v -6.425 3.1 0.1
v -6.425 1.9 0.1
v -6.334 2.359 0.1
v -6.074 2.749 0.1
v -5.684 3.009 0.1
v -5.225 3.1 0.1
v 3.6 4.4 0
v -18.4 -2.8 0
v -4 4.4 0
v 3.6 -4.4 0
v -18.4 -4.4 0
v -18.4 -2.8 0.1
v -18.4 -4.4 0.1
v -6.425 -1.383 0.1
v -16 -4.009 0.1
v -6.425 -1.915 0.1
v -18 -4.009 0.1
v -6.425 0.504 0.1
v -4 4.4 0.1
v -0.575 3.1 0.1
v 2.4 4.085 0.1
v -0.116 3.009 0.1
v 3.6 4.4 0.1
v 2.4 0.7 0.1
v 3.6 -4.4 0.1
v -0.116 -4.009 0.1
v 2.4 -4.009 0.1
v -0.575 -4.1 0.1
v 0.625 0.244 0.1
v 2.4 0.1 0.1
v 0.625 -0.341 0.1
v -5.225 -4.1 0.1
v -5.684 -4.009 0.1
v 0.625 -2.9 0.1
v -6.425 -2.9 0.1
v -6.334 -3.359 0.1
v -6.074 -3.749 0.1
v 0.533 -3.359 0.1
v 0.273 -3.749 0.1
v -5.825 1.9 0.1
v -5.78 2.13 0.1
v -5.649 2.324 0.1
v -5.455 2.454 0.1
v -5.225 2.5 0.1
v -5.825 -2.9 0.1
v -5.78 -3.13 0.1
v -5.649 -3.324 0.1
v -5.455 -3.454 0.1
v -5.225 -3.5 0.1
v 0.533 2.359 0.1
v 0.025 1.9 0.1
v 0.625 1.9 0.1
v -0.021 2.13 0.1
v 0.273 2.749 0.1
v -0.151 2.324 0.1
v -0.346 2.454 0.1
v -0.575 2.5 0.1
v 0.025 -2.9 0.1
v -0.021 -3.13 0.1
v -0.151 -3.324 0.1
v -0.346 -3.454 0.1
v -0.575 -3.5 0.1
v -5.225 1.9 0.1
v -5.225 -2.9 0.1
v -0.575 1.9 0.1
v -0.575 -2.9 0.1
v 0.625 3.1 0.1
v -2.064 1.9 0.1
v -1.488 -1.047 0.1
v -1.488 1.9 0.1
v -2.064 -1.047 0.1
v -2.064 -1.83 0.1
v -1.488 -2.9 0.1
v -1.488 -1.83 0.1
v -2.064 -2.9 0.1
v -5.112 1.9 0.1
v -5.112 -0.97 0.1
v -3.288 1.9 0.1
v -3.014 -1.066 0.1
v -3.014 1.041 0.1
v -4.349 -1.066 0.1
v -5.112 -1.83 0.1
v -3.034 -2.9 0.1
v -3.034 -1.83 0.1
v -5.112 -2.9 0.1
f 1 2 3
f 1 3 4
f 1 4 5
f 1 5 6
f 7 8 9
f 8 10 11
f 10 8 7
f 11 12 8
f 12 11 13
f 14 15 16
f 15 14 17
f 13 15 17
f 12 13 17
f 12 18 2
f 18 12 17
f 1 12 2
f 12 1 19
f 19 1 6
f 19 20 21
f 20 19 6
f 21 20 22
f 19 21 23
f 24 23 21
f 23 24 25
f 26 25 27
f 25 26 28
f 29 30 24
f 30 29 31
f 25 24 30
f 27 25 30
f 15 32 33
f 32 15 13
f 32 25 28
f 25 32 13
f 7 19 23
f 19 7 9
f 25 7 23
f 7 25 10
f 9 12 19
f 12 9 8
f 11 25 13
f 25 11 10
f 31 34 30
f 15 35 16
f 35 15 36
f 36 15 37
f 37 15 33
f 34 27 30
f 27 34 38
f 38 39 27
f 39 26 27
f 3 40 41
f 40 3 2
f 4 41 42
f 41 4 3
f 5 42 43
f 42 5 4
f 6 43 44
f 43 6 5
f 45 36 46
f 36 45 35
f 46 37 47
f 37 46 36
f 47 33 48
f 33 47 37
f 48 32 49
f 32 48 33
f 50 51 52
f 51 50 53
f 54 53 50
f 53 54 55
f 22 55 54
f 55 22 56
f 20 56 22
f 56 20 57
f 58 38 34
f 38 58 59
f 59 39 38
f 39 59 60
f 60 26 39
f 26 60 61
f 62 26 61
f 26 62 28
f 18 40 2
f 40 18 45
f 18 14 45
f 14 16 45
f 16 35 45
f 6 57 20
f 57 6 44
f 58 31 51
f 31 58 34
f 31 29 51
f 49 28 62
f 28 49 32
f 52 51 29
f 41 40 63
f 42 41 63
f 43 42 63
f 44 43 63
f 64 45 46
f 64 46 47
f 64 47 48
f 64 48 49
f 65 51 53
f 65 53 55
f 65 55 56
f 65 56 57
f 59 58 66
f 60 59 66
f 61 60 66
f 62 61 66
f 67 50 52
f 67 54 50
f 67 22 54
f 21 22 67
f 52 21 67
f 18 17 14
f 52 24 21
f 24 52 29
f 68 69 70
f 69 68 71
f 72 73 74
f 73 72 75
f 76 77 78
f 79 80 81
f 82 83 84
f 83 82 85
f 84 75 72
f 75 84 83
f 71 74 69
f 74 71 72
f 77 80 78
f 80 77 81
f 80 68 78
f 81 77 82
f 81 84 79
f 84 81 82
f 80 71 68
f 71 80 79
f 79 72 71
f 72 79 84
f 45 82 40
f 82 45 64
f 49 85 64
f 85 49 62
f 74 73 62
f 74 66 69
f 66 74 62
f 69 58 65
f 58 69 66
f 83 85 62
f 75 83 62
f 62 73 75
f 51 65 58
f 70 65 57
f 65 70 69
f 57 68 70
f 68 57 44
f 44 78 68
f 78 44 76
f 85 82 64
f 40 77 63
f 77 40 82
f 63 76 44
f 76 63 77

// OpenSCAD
// file: ../p/1-4ndis.scad
use <../lib.scad>
function ldraw_lib__1_4ndis() = [
// 0 Disc Negative 0.25
// 0 Name: 1-4ndis.dat
// 0 Author: James Jessiman
// 0 !LDRAW_ORG Primitive UPDATE 2012-01
// 0 !LICENSE Licensed under CC BY 2.0 and CC BY 4.0 : see CAreadme.txt
// 
// 0 BFC CERTIFY CCW
  [0,"BFC","CERTIFY"],
  [0,"BFC","CCW"],
// 
// 0 !HISTORY 2002-03-23 [sbliss] Added BFC Statement
// 0 !HISTORY 2002-04-25 [PTadmin] Official Update 2002-02
// 0 !HISTORY 2007-06-22 [PTadmin] Header formatted for Contributor Agreement
// 0 !HISTORY 2008-07-01 [PTadmin] Official Update 2008-01
// 0 !HISTORY 2012-02-16 [Philo] Changed to CCW
// 0 !HISTORY 2012-03-30 [PTadmin] Official Update 2012-01
// 
// 
// 3 16 0.9239 0 0.3827 1 0 0 1 0 1
  [3,16,0.9239,0,0.3827,1,0,0,1,0,1],
// 3 16 0.7071 0 0.7071 0.9239 0 0.3827 1 0 1
  [3,16,0.7071,0,0.7071,0.9239,0,0.3827,1,0,1],
// 3 16 0.3827 0 0.9239 0.7071 0 0.7071 1 0 1
  [3,16,0.3827,0,0.9239,0.7071,0,0.7071,1,0,1],
// 3 16 0 0 1 0.3827 0 0.9239 1 0 1
  [3,16,0,0,1,0.3827,0,0.9239,1,0,1],
];
module ldraw_lib__1_4ndis(step=0, col=false, unit=2/5, alt=false, line=0.2, solid=!$preview)
    makepoly(ldraw_lib__1_4ndis(), step=step, col=col, unit=unit, alt=alt, line=line, solid=solid);
ldraw_lib__1_4ndis(line=0.2);
// file: ../p/3-16ndis.scad
use <../lib.scad>
function ldraw_lib__3_16ndis() = [
// 0 Disc Negative 0.1875
// 0 Name: 3-16ndis.dat
// 0 Author: Guy Vivan [guyvivan]
// 0 !LDRAW_ORG Primitive UPDATE 2009-01
// 0 !LICENSE Licensed under CC BY 2.0 and CC BY 4.0 : see CAreadme.txt
// 
// 0 BFC CERTIFY CCW
  [0,"BFC","CERTIFY"],
  [0,"BFC","CCW"],
// 
// 0 !HISTORY 2009-05-02 [PTadmin] Official Update 2009-01
// 
// 
// 3 16 1 0 1 0.9239 0 0.3827 1 0 0
  [3,16,1,0,1,0.9239,0,0.3827,1,0,0],
// 3 16 1 0 1 0.7071 0 0.7071 0.9239 0 0.3827
  [3,16,1,0,1,0.7071,0,0.7071,0.9239,0,0.3827],
// 3 16 1 0 1 0.3827 0 0.9239 0.7071 0 0.7071
  [3,16,1,0,1,0.3827,0,0.9239,0.7071,0,0.7071],
// 
// 0 end of file
// 
];
module ldraw_lib__3_16ndis(step=0, col=false, unit=2/5, alt=false, line=0.2, solid=!$preview)
    makepoly(ldraw_lib__3_16ndis(), step=step, col=col, unit=unit, alt=alt, line=line, solid=solid);
ldraw_lib__3_16ndis(line=0.2);
// file: ../p/1-4ring1.scad
use <../lib.scad>
function ldraw_lib__1_4ring1() = [
// 0 Ring  1 x 0.25
// 0 Name: 1-4ring1.dat
// 0 Author: Chris Dee [cwdee]
// 0 !LDRAW_ORG Primitive UPDATE 2012-01
// 0 !LICENSE Licensed under CC BY 2.0 and CC BY 4.0 : see CAreadme.txt
// 
// 0 BFC CERTIFY CCW
  [0,"BFC","CERTIFY"],
  [0,"BFC","CCW"],
// 
// 0 !HISTORY 2000-05-07 [PTadmin] Official Update 2000-01
// 0 !HISTORY 2002-11-22 [hafhead] Added BFC statement
// 0 !HISTORY 2002-11-30 [PTadmin] Official Update 2002-05
// 0 !HISTORY 2007-06-22 [PTadmin] Header formatted for Contributor Agreement
// 0 !HISTORY 2008-07-01 [PTadmin] Official Update 2008-01
// 0 !HISTORY 2012-02-16 [Philo] Changed to CCW
// 0 !HISTORY 2012-03-30 [PTadmin] Official Update 2012-01
// 
// 
// 4 16 2 0 0 1.8478 0 0.7654 0.9239 0 0.3827 1 0 0
  [4,16,2,0,0,1.8478,0,0.7654,0.9239,0,0.3827,1,0,0],
// 4 16 1.8478 0 0.7654 1.4142 0 1.4142 0.7071 0 0.7071 0.9239 0 0.3827
  [4,16,1.8478,0,0.7654,1.4142,0,1.4142,0.7071,0,0.7071,0.9239,0,0.3827],
// 4 16 1.4142 0 1.4142 0.7654 0 1.8478 0.3827 0 0.9239 0.7071 0 0.7071
  [4,16,1.4142,0,1.4142,0.7654,0,1.8478,0.3827,0,0.9239,0.7071,0,0.7071],
// 4 16 0.7654 0 1.8478 0 0 2 0 0 1 0.3827 0 0.9239
  [4,16,0.7654,0,1.8478,0,0,2,0,0,1,0.3827,0,0.9239],
];
module ldraw_lib__1_4ring1(step=0, col=false, unit=2/5, alt=false, line=0.2, solid=!$preview)
    makepoly(ldraw_lib__1_4ring1(), step=step, col=col, unit=unit, alt=alt, line=line, solid=solid);
ldraw_lib__1_4ring1(line=0.2);
// file: ../p/1-4disc.scad
use <../lib.scad>
function ldraw_lib__1_4disc() = [
// 0 Disc 0.25
// 0 Name: 1-4disc.dat
// 0 Author: James Jessiman
// 0 !LDRAW_ORG Primitive UPDATE 2002-02
// 0 !LICENSE Licensed under CC BY 2.0 and CC BY 4.0 : see CAreadme.txt
// 
// 0 BFC CERTIFY CCW
  [0,"BFC","CERTIFY"],
  [0,"BFC","CCW"],
// 
// 0 !HISTORY 2002-03-23 [sbliss] Added BFC statement.
// 0 !HISTORY 2002-04-25 [PTadmin] Official Update 2002-02
// 0 !HISTORY 2007-06-22 [PTadmin] Header formatted for Contributor Agreement
// 0 !HISTORY 2008-07-01 [PTadmin] Official Update 2008-01
// 
// 
// 3 16 0 0 0 1 0 0 0.9239 0 0.3827
  [3,16,0,0,0,1,0,0,0.9239,0,0.3827],
// 3 16 0 0 0 0.9239 0 0.3827 0.7071 0 0.7071
  [3,16,0,0,0,0.9239,0,0.3827,0.7071,0,0.7071],
// 3 16 0 0 0 0.7071 0 0.7071 0.3827 0 0.9239
  [3,16,0,0,0,0.7071,0,0.7071,0.3827,0,0.9239],
// 3 16 0 0 0 0.3827 0 0.9239 0 0 1
  [3,16,0,0,0,0.3827,0,0.9239,0,0,1],
// 0
];
module ldraw_lib__1_4disc(step=0, col=false, unit=2/5, alt=false, line=0.2, solid=!$preview)
    makepoly(ldraw_lib__1_4disc(), step=step, col=col, unit=unit, alt=alt, line=line, solid=solid);
ldraw_lib__1_4disc(line=0.2);
// file: ../p/type-swiss721bt-bold-n4.scad
use <../lib.scad>
function ldraw_lib__type_swiss721bt_bold_n4() = [
// 0 Type Swiss721BT Number "4" Bold
// 0 Name: type-swiss721bt-bold-n4.dat
// 0 Author: Ulrich Röder [UR]
// 0 !LDRAW_ORG Primitive UPDATE 2019-01
// 0 !LICENSE Licensed under CC BY 2.0 and CC BY 4.0 : see CAreadme.txt
// 
// 0 BFC CERTIFY CCW
  [0,"BFC","CERTIFY"],
  [0,"BFC","CCW"],
// 
// 0 !HISTORY 2019-06-28 [PTadmin] Official Update 2019-01
// 
// 
// 0 // Main
// 4 16 .3775 0 .5 .2575 0 .5 .2575 0 -.114 .3775 0 -.114
  [4,16,.3775,0,.5,.2575,0,.5,.2575,0,-.114,.3775,0,-.114],
// 4 16 .2575 0 -.5 .3775 0 -.5 .3775 0 -.277 .2575 0 -.277
  [4,16,.2575,0,-.5,.3775,0,-.5,.3775,0,-.277,.2575,0,-.277],
// 3 16 -.3775 0 .5 -.3775 0 -.098 .0025 0 .5
  [3,16,-.3775,0,.5,-.3775,0,-.098,.0025,0,.5],
// 3 16 .0595 0 -.118 .0595 0 .321 -.2185 0 -.118
  [3,16,.0595,0,-.118,.0595,0,.321,-.2185,0,-.118],
// 4 16 .0555 0 -.5 .0555 0 -.277 -.3775 0 -.277 -.3775 0 -.5
  [4,16,.0555,0,-.5,.0555,0,-.277,-.3775,0,-.277,-.3775,0,-.5],
// 
// 0 // Black
// 4 0 .0555 0 -.5 .2575 0 -.5 .2575 0 -.277 .0555 0 -.277
  [4,0,.0555,0,-.5,.2575,0,-.5,.2575,0,-.277,.0555,0,-.277],
// 4 0 .2575 0 -.114 .2575 0 -.277 .3775 0 -.277 .3775 0 -.114
  [4,0,.2575,0,-.114,.2575,0,-.277,.3775,0,-.277,.3775,0,-.114],
// 4 0 -.2185 0 -.118 .0595 0 .321 .0025 0 .5 -.3775 0 -.098
  [4,0,-.2185,0,-.118,.0595,0,.321,.0025,0,.5,-.3775,0,-.098],
// 3 0 .0595 0 .321 .2575 0 .5 .0025 0 .5
  [3,0,.0595,0,.321,.2575,0,.5,.0025,0,.5],
// 3 0 -.2185 0 -.118 -.3775 0 -.098 -.3775 0 -.277
  [3,0,-.2185,0,-.118,-.3775,0,-.098,-.3775,0,-.277],
// 4 0 .0595 0 -.118 -.2185 0 -.118 -.3775 0 -.277 .0555 0 -.277
  [4,0,.0595,0,-.118,-.2185,0,-.118,-.3775,0,-.277,.0555,0,-.277],
// 4 0 .2575 0 -.114 .2575 0 .5 .0595 0 .321 .0595 0 -.118
  [4,0,.2575,0,-.114,.2575,0,.5,.0595,0,.321,.0595,0,-.118],
// 4 0 .0555 0 -.277 .2575 0 -.277 .2575 0 -.114 .0595 0 -.118
  [4,0,.0555,0,-.277,.2575,0,-.277,.2575,0,-.114,.0595,0,-.118],
];
module ldraw_lib__type_swiss721bt_bold_n4(step=0, col=false, unit=2/5, alt=false, line=0.2, solid=!$preview)
    makepoly(ldraw_lib__type_swiss721bt_bold_n4(), step=step, col=col, unit=unit, alt=alt, line=line, solid=solid);
ldraw_lib__type_swiss721bt_bold_n4(line=0.2);
// file: s/821435as03.scad
use <../../lib.scad>
use <../../p/1-4ndis.scad>
function ldraw_lib__s__821435as03() = [
// 0 ~Sticker Sloped Body for Racing Number
// 0 Name: s\821435as03.dat
// 0 Author: Ulrich Röder [UR]
// 0 !LDRAW_ORG Subpart UPDATE 2019-01
// 0 !LICENSE Licensed under CC BY 2.0 and CC BY 4.0 : see CAreadme.txt
// 
// 0 BFC CERTIFY CCW
  [0,"BFC","CERTIFY"],
  [0,"BFC","CCW"],
// 
// 0 !HISTORY 2019-06-28 [PTadmin] Official Update 2019-01
// 
// 
// 0 // Main
// 1 16 13.063 -.25 4.75 3 0 0 0 1 0 0 0 3 1-4ndis.dat
  [1,16,13.063,-.25,4.75,3,0,0,0,1,0,0,0,3, ldraw_lib__1_4ndis()],
// 3 16 10 0 11 46 0 -7 -9 0 11
  [3,16,10,0,11,46,0,-7,-9,0,11],
// 4 16 -9 0 -11 -9 0 11 46 0 -7 46 0 -11
  [4,16,-9,0,-11,-9,0,11,46,0,-7,46,0,-11],
// 4 16 46 -.25 -11 46 0 -11 46 0 -7 46 -.25 -7
  [4,16,46,-.25,-11,46,0,-11,46,0,-7,46,-.25,-7],
// 4 16 16.063 -.25 -4.788 40 -.25 -10.022 45 -.25 -10.022 16.063 -.25 -3.458
  [4,16,16.063,-.25,-4.788,40,-.25,-10.022,45,-.25,-10.022,16.063,-.25,-3.458],
// 3 16 45 -.25 -10.022 40 -.25 -10.022 46 -.25 -11
  [3,16,45,-.25,-10.022,40,-.25,-10.022,46,-.25,-11],
// 3 16 45 -.25 -10.022 46 -.25 -11 46 -.25 -7
  [3,16,45,-.25,-10.022,46,-.25,-11,46,-.25,-7],
// 4 16 16.063 -.25 4.75 16.063 -.25 1.261 45 -.25 -10.022 46 -.25 -7
  [4,16,16.063,-.25,4.75,16.063,-.25,1.261,45,-.25,-10.022,46,-.25,-7],
// 3 16 16.063 -.25 4.75 46 -.25 -7 16.063 -.25 7.75
  [3,16,16.063,-.25,4.75,46,-.25,-7,16.063,-.25,7.75],
// 3 16 10 -.25 11 16.063 -.25 7.75 46 -.25 -7
  [3,16,10,-.25,11,16.063,-.25,7.75,46,-.25,-7],
// 3 16 13.063 -.25 7.75 16.063 -.25 7.75 10 -.25 11
  [3,16,13.063,-.25,7.75,16.063,-.25,7.75,10,-.25,11],
// 4 16 -6 -.25 10.213 1.438 -.25 7.75 13.063 -.25 7.75 10 -.25 11
  [4,16,-6,-.25,10.213,1.438,-.25,7.75,13.063,-.25,7.75,10,-.25,11],
// 3 16 .2899 -.25 7.5217 1.438 -.25 7.75 -6 -.25 10.213
  [3,16,.2899,-.25,7.5217,1.438,-.25,7.75,-6,-.25,10.213],
// 3 16 -9 -.25 11 -6 -.25 10.213 10 -.25 11
  [3,16,-9,-.25,11,-6,-.25,10.213,10,-.25,11],
// 4 16 -9 -.25 -11 -6 -.25 1.75 -6 -.25 10.213 -9 -.25 11
  [4,16,-9,-.25,-11,-6,-.25,1.75,-6,-.25,10.213,-9,-.25,11],
// 4 16 1.438 -.25 -10.25 .2899 -.25 -10.0217 -6 -.25 -10.022 -9 -.25 -11
  [4,16,1.438,-.25,-10.25,.2899,-.25,-10.0217,-6,-.25,-10.022,-9,-.25,-11],
// 4 16 -1.563 -.25 .61 -6 -.25 1.75 -6 -.25 .25 -1.563 -.25 -.853
  [4,16,-1.563,-.25,.61,-6,-.25,1.75,-6,-.25,.25,-1.563,-.25,-.853],
// 3 16 -6 -.25 .25 -6 -.25 1.75 -9 -.25 -11
  [3,16,-6,-.25,.25,-6,-.25,1.75,-9,-.25,-11],
// 3 16 -6 -.25 .25 -9 -.25 -11 -6 -.25 -10.022
  [3,16,-6,-.25,.25,-9,-.25,-11,-6,-.25,-10.022],
// 4 16 40 -.25 -10.022 14.2111 -.25 -10.0217 13.063 -.25 -10.25 46 -.25 -11
  [4,16,40,-.25,-10.022,14.2111,-.25,-10.0217,13.063,-.25,-10.25,46,-.25,-11],
// 4 16 1.438 -.25 -10.25 -9 -.25 -11 46 -.25 -11 13.063 -.25 -10.25
  [4,16,1.438,-.25,-10.25,-9,-.25,-11,46,-.25,-11,13.063,-.25,-10.25],
// 4 16 -9 -.25 11 10 -.25 11 10 0 11 -9 0 11
  [4,16,-9,-.25,11,10,-.25,11,10,0,11,-9,0,11],
// 4 16 -9 0 11 -9 0 -11 -9 -.25 -11 -9 -.25 11
  [4,16,-9,0,11,-9,0,-11,-9,-.25,-11,-9,-.25,11],
// 4 16 10 -.25 11 46 -.25 -7 46 0 -7 10 0 11
  [4,16,10,-.25,11,46,-.25,-7,46,0,-7,10,0,11],
// 4 16 46 0 -11 46 -.25 -11 -9 -.25 -11 -9 0 -11
  [4,16,46,0,-11,46,-.25,-11,-9,-.25,-11,-9,0,-11],
];
module ldraw_lib__s__821435as03(step=0, col=false, unit=2/5, alt=false, line=0.2, solid=!$preview)
    makepoly(ldraw_lib__s__821435as03(), step=step, col=col, unit=unit, alt=alt, line=line, solid=solid);
ldraw_lib__s__821435as03(line=0.2);
// file: s/821435as02.scad
use <../../lib.scad>
use <../../p/3-16ndis.scad>
function ldraw_lib__s__821435as02() = [
// 0 ~Sticker Upper Triangle with Cutout for Racing Number
// 0 Name: s\821435as02.dat
// 0 Author: Ulrich Röder [UR]
// 0 !LDRAW_ORG Subpart UPDATE 2019-01
// 0 !LICENSE Licensed under CC BY 2.0 and CC BY 4.0 : see CAreadme.txt
// 
// 0 BFC CERTIFY CCW
  [0,"BFC","CERTIFY"],
  [0,"BFC","CCW"],
// 
// 0 !HISTORY 2019-06-28 [PTadmin] Official Update 2019-01
// 
// 
// 0 // Main
// 1 16 1.438 -.25 4.75 -3 0 0 0 1 0 0 0 3 3-16ndis.dat
  [1,16,1.438,-.25,4.75,-3,0,0,0,1,0,0,0,3, ldraw_lib__3_16ndis()],
// 3 16 -1.562 -.25 7.75 .2899 -.25 7.5217 -6 -.25 10.213
  [3,16,-1.562,-.25,7.75,.2899,-.25,7.5217,-6,-.25,10.213],
// 3 16 -1.562 -.25 7.75 -6 -.25 10.213 -1.562 -.25 4.75
  [3,16,-1.562,-.25,7.75,-6,-.25,10.213,-1.562,-.25,4.75],
// 3 16 16.063 -.25 -3.458 45 -.25 -10.022 16.063 -.25 1.261
  [3,16,16.063,-.25,-3.458,45,-.25,-10.022,16.063,-.25,1.261],
// 4 16 -6 -.25 1.75 -1.563 -.25 .61 -1.562 -.25 4.75 -6 -.25 10.213
  [4,16,-6,-.25,1.75,-1.563,-.25,.61,-1.562,-.25,4.75,-6,-.25,10.213],
];
module ldraw_lib__s__821435as02(step=0, col=false, unit=2/5, alt=false, line=0.2, solid=!$preview)
    makepoly(ldraw_lib__s__821435as02(), step=step, col=col, unit=unit, alt=alt, line=line, solid=solid);
ldraw_lib__s__821435as02(line=0.2);
// file: s/821435as01.scad
use <../../lib.scad>
use <../../p/1-4disc.scad>
use <../../p/1-4ring1.scad>
function ldraw_lib__s__821435as01() = [
// 0 ~Sticker Lower Triangle and Racing Number Frame
// 0 Name: s\821435as01.dat
// 0 Author: Ulrich Röder [UR]
// 0 !LDRAW_ORG Subpart UPDATE 2019-01
// 0 !LICENSE Licensed under CC BY 2.0 and CC BY 4.0 : see CAreadme.txt
// 
// 0 BFC CERTIFY CCW
  [0,"BFC","CERTIFY"],
  [0,"BFC","CCW"],
// 
// 0 !HISTORY 2019-06-28 [PTadmin] Official Update 2019-01
// 
// 
// 0 // Main
// 
// 3 16 -6 -0.25 0.25 -1.562 -0.25 -7.25 -1.563 -0.25 -0.853
  [3,16,-6,-0.25,0.25,-1.562,-0.25,-7.25,-1.563,-0.25,-0.853],
// 3 16 16.063 -0.25 -4.788 16.063 -0.25 -7.25 40 -0.25 -10.022
  [3,16,16.063,-0.25,-4.788,16.063,-0.25,-7.25,40,-0.25,-10.022],
// 3 16 15.8347 -0.25 -8.3981 40 -0.25 -10.022 16.063 -0.25 -7.25
  [3,16,15.8347,-0.25,-8.3981,40,-0.25,-10.022,16.063,-0.25,-7.25],
// 3 16 15.1843 -0.25 -9.3713 40 -0.25 -10.022 15.8347 -0.25 -8.3981
  [3,16,15.1843,-0.25,-9.3713,40,-0.25,-10.022,15.8347,-0.25,-8.3981],
// 3 16 14.2111 -0.25 -10.0217 40 -0.25 -10.022 15.1843 -0.25 -9.3713
  [3,16,14.2111,-0.25,-10.0217,40,-0.25,-10.022,15.1843,-0.25,-9.3713],
// 4 16 -6 -0.25 0.25 -6 -0.25 -10.022 -1.3337 -0.25 -8.3981 -1.562 -0.25 -7.25
  [4,16,-6,-0.25,0.25,-6,-0.25,-10.022,-1.3337,-0.25,-8.3981,-1.562,-0.25,-7.25],
// 3 16 -6 -0.25 -10.022 -0.6833 -0.25 -9.3713 -1.3337 -0.25 -8.3981
  [3,16,-6,-0.25,-10.022,-0.6833,-0.25,-9.3713,-1.3337,-0.25,-8.3981],
// 3 16 -6 -0.25 -10.022 0.2899 -0.25 -10.0217 -0.6833 -0.25 -9.3713
  [3,16,-6,-0.25,-10.022,0.2899,-0.25,-10.0217,-0.6833,-0.25,-9.3713],
// 
// 0 // Black
// 1 0 13.063 -.25 4.75 1.5 0 0 0 1 0 0 0 1.5 1-4ring1.dat
  [1,0,13.063,-.25,4.75,1.5,0,0,0,1,0,0,0,1.5, ldraw_lib__1_4ring1()],
// 1 0 13.063 -.25 -7.25 1.5 0 0 0 1 0 0 0 -1.5 1-4ring1.dat
  [1,0,13.063,-.25,-7.25,1.5,0,0,0,1,0,0,0,-1.5, ldraw_lib__1_4ring1()],
// 1 0 1.438 -.25 4.75 -1.5 0 0 0 1 0 0 0 1.5 1-4ring1.dat
  [1,0,1.438,-.25,4.75,-1.5,0,0,0,1,0,0,0,1.5, ldraw_lib__1_4ring1()],
// 1 0 1.438 -.25 -7.25 -1.5 0 0 0 1 0 0 0 -1.5 1-4ring1.dat
  [1,0,1.438,-.25,-7.25,-1.5,0,0,0,1,0,0,0,-1.5, ldraw_lib__1_4ring1()],
// 4 0 14.563 -0.25 4.75 14.563 -0.25 -7.25 16.063 -0.25 1.261 16.063 -0.25 4.75
  [4,0,14.563,-0.25,4.75,14.563,-0.25,-7.25,16.063,-0.25,1.261,16.063,-0.25,4.75],
// 3 0 14.563 -0.25 -7.25 16.063 -0.25 -3.458 16.063 -0.25 1.261
  [3,0,14.563,-0.25,-7.25,16.063,-0.25,-3.458,16.063,-0.25,1.261],
// 3 0 14.563 -0.25 -7.25 16.063 -0.25 -4.788 16.063 -0.25 -3.458
  [3,0,14.563,-0.25,-7.25,16.063,-0.25,-4.788,16.063,-0.25,-3.458],
// 3 0 14.563 -0.25 -7.25 16.063 -0.25 -7.25 16.063 -0.25 -4.788
  [3,0,14.563,-0.25,-7.25,16.063,-0.25,-7.25,16.063,-0.25,-4.788],
// 4 0 13.063 -0.25 6.25 13.063 -0.25 7.75 1.438 -0.25 7.75 1.438 -0.25 6.25
  [4,0,13.063,-0.25,6.25,13.063,-0.25,7.75,1.438,-0.25,7.75,1.438,-0.25,6.25],
// 4 0 -0.062 -0.25 4.75 -1.563 -0.25 -0.853 -1.562 -0.25 -7.25 -0.062 -0.25 -7.25
  [4,0,-0.062,-0.25,4.75,-1.563,-0.25,-0.853,-1.562,-0.25,-7.25,-0.062,-0.25,-7.25],
// 3 0 -0.062 -0.25 4.75 -1.563 -0.25 0.61 -1.563 -0.25 -0.853
  [3,0,-0.062,-0.25,4.75,-1.563,-0.25,0.61,-1.563,-0.25,-0.853],
// 4 0 1.438 -0.25 -10.25 13.063 -0.25 -10.25 13.063 -0.25 -8.75 1.438 -0.25 -8.75
  [4,0,1.438,-0.25,-10.25,13.063,-0.25,-10.25,13.063,-0.25,-8.75,1.438,-0.25,-8.75],
// 3 0 -1.563 -0.25 0.61 -0.062 -0.25 4.75 -1.562 -0.25 4.75
  [3,0,-1.563,-0.25,0.61,-0.062,-0.25,4.75,-1.562,-0.25,4.75],
// 
// 0 // White
// 1 15 13.063 -.25 4.75 1.5 0 0 0 1 0 0 0 1.5 1-4disc.dat
  [1,15,13.063,-.25,4.75,1.5,0,0,0,1,0,0,0,1.5, ldraw_lib__1_4disc()],
// 1 15 13.063 -.25 -7.25 1.5 0 0 0 1 0 0 0 -1.5 1-4disc.dat
  [1,15,13.063,-.25,-7.25,1.5,0,0,0,1,0,0,0,-1.5, ldraw_lib__1_4disc()],
// 1 15 1.438 -.25 4.75 -1.5 0 0 0 1 0 0 0 1.5 1-4disc.dat
  [1,15,1.438,-.25,4.75,-1.5,0,0,0,1,0,0,0,1.5, ldraw_lib__1_4disc()],
// 1 15 1.438 -.25 -7.25 -1.5 0 0 0 1 0 0 0 -1.5 1-4disc.dat
  [1,15,1.438,-.25,-7.25,-1.5,0,0,0,1,0,0,0,-1.5, ldraw_lib__1_4disc()],
];
module ldraw_lib__s__821435as01(step=0, col=false, unit=2/5, alt=false, line=0.2, solid=!$preview)
    makepoly(ldraw_lib__s__821435as01(), step=step, col=col, unit=unit, alt=alt, line=line, solid=solid);
ldraw_lib__s__821435as01(line=0.2);
// main file
use <../lib.scad>
use <s/821435as01.scad>
use <s/821435as02.scad>
use <s/821435as03.scad>
use <../p/type-swiss721bt-bold-n4.scad>
function ldraw_lib__821435h() = [
// 0 Sticker with White/Red Triangles and Racing Number "4", Left
// 0 Name: 821435h.dat
// 0 Author: Ulrich Röder [UR]
// 0 !LDRAW_ORG Part UPDATE 2019-01
// 0 !LICENSE Licensed under CC BY 2.0 and CC BY 4.0 : see CAreadme.txt
// 
// 0 BFC CERTIFY CCW
  [0,"BFC","CERTIFY"],
  [0,"BFC","CCW"],
// 
// 0 !KEYWORDS cup, Racers, Set 6539
// 
// 0 !HISTORY 2019-06-28 [PTadmin] Official Update 2019-01
// 
// 
// 0 // Main
// 
// 1 16 0 0 0 -1 0 0 0 1 0 0 0 1 s\821435as03.dat
  [1,16,0,0,0,-1,0,0,0,1,0,0,0,1, ldraw_lib__s__821435as03()],
// 
// 0 // Red
// 1 4 0 0 0 -1 0 0 0 1 0 0 0 1 s\821435as01.dat
  [1,4,0,0,0,-1,0,0,0,1,0,0,0,1, ldraw_lib__s__821435as01()],
// 
// 0 // White
// 1 15 0 0 0 -1 0 0 0 1 0 0 0 1 s\821435as02.dat
  [1,15,0,0,0,-1,0,0,0,1,0,0,0,1, ldraw_lib__s__821435as02()],
// 1 15 -8.25 -.25 -1.25 12 0 0 0 1 0 0 0 12 type-swiss721bt-bold-n4.dat
  [1,15,-8.25,-.25,-1.25,12,0,0,0,1,0,0,0,12, ldraw_lib__type_swiss721bt_bold_n4()],
// 4 15 -12.78 -.25 -4.574 -14.563 -.25 4.75 -14.563 -.25 -7.25 -13.063 -.25 -7.25
  [4,15,-12.78,-.25,-4.574,-14.563,-.25,4.75,-14.563,-.25,-7.25,-13.063,-.25,-7.25],
// 4 15 -1.438 -.25 -8.75 -12.78 -.25 -7.25 -13.063 -.25 -7.25 -13.063 -.25 -8.75
  [4,15,-1.438,-.25,-8.75,-12.78,-.25,-7.25,-13.063,-.25,-7.25,-13.063,-.25,-8.75],
// 3 15 -3.72 -.25 -4.574 -3.72 -.25 -7.25 -1.438 -.25 -8.75
  [3,15,-3.72,-.25,-4.574,-3.72,-.25,-7.25,-1.438,-.25,-8.75],
// 4 15 -3.72 -.25 -2.618 -3.72 -.25 -4.574 -1.438 -.25 -8.75 -1.438 -.25 -7.25
  [4,15,-3.72,-.25,-2.618,-3.72,-.25,-4.574,-1.438,-.25,-8.75,-1.438,-.25,-7.25],
// 4 15 -1.438 -.25 4.75 -3.72 -.25 -2.618 -1.438 -.25 -7.25 .062 -.25 -7.25
  [4,15,-1.438,-.25,4.75,-3.72,-.25,-2.618,-1.438,-.25,-7.25,.062,-.25,-7.25],
// 3 15 -7.584 -.25 -7.25 -12.78 -.25 -7.25 -1.438 -.25 -8.75
  [3,15,-7.584,-.25,-7.25,-12.78,-.25,-7.25,-1.438,-.25,-8.75],
// 3 15 -5.16 -.25 -7.25 -7.584 -.25 -7.25 -1.438 -.25 -8.75
  [3,15,-5.16,-.25,-7.25,-7.584,-.25,-7.25,-1.438,-.25,-8.75],
// 3 15 -1.438 -.25 -8.75 -3.72 -.25 -7.25 -5.16 -.25 -7.25
  [3,15,-1.438,-.25,-8.75,-3.72,-.25,-7.25,-5.16,-.25,-7.25],
// 3 15 .062 -.25 4.75 -1.438 -.25 4.75 .062 -.25 -7.25
  [3,15,.062,-.25,4.75,-1.438,-.25,4.75,.062,-.25,-7.25],
// 4 15 -1.438 -.25 6.25 -3.72 -.25 4.75 -3.72 -.25 -2.618 -1.438 -.25 4.75
  [4,15,-1.438,-.25,6.25,-3.72,-.25,4.75,-3.72,-.25,-2.618,-1.438,-.25,4.75],
// 4 15 -1.438 -.25 6.25 -13.063 -.25 6.25 -5.16 -.25 4.75 -3.72 -.25 4.75
  [4,15,-1.438,-.25,6.25,-13.063,-.25,6.25,-5.16,-.25,4.75,-3.72,-.25,4.75],
// 3 15 -13.063 -.25 6.25 -8.22 -.25 4.75 -5.16 -.25 4.75
  [3,15,-13.063,-.25,6.25,-8.22,-.25,4.75,-5.16,-.25,4.75],
// 3 15 -8.22 -.25 4.75 -13.063 -.25 6.25 -12.78 -.25 4.75
  [3,15,-8.22,-.25,4.75,-13.063,-.25,6.25,-12.78,-.25,4.75],
// 3 15 -12.78 -.25 -7.25 -12.78 -.25 -4.574 -13.063 -.25 -7.25
  [3,15,-12.78,-.25,-7.25,-12.78,-.25,-4.574,-13.063,-.25,-7.25],
// 4 15 -13.063 -.25 4.75 -14.563 -.25 4.75 -12.78 -.25 -4.574 -12.78 -.25 -2.426
  [4,15,-13.063,-.25,4.75,-14.563,-.25,4.75,-12.78,-.25,-4.574,-12.78,-.25,-2.426],
// 4 15 -13.063 -.25 6.25 -13.063 -.25 4.75 -12.78 -.25 -2.426 -12.78 -.25 4.75
  [4,15,-13.063,-.25,6.25,-13.063,-.25,4.75,-12.78,-.25,-2.426,-12.78,-.25,4.75],
];
module ldraw_lib__821435h(step=0, col=false, unit=2/5, alt=false, line=0.2, solid=!$preview)
    makepoly(ldraw_lib__821435h(), step=step, col=col, unit=unit, alt=alt, line=line, solid=solid);
ldraw_lib__821435h(line=0.2);
